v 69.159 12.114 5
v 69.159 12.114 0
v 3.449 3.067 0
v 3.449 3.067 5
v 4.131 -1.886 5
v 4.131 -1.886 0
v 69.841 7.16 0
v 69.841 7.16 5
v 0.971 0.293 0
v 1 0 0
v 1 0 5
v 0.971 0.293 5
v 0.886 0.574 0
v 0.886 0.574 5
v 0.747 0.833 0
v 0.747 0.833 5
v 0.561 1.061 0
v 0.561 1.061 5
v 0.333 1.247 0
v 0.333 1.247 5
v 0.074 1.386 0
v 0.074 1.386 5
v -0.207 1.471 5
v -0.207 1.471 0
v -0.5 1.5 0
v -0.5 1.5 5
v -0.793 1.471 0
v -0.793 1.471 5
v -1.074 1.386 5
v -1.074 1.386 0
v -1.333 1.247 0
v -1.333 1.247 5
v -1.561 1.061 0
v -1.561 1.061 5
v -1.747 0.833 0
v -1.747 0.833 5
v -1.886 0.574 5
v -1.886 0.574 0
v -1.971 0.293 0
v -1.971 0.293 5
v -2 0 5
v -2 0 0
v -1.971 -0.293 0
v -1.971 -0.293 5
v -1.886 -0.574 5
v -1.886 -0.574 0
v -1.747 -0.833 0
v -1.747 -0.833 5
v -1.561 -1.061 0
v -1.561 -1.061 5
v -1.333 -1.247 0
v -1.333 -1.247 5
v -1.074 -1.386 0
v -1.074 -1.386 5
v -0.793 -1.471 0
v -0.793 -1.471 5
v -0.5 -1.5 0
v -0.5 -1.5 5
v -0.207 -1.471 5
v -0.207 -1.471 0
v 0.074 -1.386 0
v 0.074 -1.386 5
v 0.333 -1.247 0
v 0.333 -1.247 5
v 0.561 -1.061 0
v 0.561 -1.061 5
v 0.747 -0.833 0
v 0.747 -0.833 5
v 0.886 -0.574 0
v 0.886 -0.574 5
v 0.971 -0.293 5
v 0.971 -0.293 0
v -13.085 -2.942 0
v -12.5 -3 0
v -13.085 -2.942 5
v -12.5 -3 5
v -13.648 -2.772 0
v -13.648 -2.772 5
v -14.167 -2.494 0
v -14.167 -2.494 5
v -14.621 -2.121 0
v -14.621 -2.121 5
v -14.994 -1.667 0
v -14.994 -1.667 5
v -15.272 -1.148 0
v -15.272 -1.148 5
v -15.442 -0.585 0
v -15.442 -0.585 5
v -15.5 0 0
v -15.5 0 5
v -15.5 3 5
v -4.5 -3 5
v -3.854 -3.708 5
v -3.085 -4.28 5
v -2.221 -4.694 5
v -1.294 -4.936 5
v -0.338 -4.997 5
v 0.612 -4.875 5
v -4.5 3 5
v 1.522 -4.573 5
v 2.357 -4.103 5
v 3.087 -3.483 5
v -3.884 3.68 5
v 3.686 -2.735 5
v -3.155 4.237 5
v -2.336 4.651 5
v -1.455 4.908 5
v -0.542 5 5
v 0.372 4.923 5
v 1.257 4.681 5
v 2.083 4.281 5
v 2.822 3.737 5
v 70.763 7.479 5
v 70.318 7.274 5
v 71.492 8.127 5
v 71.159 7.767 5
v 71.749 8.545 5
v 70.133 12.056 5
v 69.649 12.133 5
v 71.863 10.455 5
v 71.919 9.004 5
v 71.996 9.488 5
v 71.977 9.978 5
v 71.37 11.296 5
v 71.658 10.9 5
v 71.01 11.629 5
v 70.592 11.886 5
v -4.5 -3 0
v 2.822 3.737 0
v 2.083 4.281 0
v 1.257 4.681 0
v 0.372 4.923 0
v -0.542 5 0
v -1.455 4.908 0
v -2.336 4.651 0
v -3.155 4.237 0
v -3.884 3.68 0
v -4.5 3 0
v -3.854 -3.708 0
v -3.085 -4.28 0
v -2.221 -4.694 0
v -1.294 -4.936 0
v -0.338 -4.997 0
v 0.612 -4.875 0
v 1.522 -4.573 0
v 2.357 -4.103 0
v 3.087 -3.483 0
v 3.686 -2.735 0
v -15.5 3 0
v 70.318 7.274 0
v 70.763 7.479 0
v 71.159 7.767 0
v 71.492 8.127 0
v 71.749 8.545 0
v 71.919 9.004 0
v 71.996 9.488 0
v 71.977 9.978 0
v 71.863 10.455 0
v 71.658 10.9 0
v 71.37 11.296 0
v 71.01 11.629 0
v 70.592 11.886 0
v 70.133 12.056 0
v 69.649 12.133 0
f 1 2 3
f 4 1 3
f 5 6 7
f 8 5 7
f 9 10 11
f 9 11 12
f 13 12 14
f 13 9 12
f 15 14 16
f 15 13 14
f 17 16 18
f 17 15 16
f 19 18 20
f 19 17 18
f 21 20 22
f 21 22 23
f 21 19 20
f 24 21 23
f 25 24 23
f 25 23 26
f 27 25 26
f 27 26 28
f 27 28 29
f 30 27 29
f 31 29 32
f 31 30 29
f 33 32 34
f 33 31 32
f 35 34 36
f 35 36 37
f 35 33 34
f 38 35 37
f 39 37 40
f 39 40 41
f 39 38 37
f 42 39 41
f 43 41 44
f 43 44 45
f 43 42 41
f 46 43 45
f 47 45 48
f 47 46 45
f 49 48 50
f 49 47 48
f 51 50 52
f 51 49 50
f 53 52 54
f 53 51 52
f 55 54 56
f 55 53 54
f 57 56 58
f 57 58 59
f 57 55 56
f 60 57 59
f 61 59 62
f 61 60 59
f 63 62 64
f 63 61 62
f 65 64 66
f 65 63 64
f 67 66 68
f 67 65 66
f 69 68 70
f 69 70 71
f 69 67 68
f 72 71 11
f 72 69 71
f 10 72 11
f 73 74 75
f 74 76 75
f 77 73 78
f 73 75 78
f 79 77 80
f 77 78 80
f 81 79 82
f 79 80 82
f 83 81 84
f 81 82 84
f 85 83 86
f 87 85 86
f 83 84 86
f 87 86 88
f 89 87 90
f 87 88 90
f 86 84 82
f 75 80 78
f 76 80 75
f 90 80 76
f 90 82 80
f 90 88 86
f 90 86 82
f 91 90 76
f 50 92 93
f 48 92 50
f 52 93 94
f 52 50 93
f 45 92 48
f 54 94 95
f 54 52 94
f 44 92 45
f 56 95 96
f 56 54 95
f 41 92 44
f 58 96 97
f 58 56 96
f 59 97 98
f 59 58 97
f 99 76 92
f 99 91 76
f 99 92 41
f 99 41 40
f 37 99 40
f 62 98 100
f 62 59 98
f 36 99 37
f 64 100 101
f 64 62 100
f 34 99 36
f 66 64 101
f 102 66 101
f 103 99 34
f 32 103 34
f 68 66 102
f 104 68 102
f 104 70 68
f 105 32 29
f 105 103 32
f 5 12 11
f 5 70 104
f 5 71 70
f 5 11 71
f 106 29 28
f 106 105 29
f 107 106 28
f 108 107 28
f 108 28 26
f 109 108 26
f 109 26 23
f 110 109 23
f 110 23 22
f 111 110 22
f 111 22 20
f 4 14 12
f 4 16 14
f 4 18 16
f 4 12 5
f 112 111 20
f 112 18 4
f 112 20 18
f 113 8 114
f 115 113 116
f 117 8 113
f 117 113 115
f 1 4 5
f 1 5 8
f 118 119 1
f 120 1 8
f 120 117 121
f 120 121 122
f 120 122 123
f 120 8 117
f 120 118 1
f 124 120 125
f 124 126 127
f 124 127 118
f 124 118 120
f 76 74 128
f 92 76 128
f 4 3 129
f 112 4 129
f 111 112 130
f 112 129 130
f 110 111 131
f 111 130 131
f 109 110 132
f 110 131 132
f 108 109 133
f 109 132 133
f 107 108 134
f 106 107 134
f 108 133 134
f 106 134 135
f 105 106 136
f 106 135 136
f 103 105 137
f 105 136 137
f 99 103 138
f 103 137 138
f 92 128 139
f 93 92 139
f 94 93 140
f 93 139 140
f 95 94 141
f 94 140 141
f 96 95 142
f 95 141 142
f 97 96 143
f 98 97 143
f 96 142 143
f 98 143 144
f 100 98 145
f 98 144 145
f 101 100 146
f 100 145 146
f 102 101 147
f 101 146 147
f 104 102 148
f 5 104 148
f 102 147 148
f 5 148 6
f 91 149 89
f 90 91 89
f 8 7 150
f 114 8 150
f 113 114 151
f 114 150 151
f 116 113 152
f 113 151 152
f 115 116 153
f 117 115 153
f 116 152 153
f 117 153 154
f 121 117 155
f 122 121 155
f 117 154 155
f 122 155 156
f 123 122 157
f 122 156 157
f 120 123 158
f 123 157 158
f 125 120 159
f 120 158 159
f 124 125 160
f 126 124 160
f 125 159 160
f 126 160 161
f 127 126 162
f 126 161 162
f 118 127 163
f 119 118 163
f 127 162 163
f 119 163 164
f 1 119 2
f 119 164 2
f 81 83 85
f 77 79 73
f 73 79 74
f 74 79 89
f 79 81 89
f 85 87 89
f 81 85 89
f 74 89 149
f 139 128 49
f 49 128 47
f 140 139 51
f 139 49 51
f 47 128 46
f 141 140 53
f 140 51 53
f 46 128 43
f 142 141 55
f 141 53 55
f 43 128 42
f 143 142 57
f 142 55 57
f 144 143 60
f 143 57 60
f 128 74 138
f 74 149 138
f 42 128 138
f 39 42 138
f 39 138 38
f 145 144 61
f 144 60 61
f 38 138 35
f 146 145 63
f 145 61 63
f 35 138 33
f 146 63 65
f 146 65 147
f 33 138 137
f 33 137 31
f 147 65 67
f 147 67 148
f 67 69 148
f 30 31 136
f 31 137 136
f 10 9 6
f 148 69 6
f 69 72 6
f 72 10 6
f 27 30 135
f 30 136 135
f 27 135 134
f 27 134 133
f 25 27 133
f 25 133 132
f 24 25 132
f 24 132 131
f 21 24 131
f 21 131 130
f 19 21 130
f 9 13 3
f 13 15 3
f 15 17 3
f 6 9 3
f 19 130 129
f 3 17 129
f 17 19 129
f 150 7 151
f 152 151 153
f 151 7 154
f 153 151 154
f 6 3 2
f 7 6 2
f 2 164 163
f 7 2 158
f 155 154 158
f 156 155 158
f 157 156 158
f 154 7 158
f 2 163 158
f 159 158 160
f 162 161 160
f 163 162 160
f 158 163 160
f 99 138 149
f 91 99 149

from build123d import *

# Parameters (mm, degrees)
SKETCH1_R           = 1.5
BOSS_EXTRUDE1_DEPTH = 5
FILLET1_R           = 3
BOSS_EXTRUDE2_START = -5
BOSS_EXTRUDE2_DEPTH = 5


with BuildPart() as part:
    # Sketch1 → Boss-Extrude1 (new body)
    with BuildSketch(Plane.XY):
        with BuildLine():
            Line((-15.5, -3), (-12.5, -3))
            Line((-12.5, -3), (-4.5, -3))
            ThreePointArc((-4.5, -3), (-0.5, -5), (3.5, -3))
            ThreePointArc((3.5, -3), (4.5, 0), (3.5, 3))
            ThreePointArc((3.5, 3), (-0.5, 5), (-4.5, 3))
            Line((-4.5, 3), (-12.5, 3))
            Line((-12.5, 3), (-15.5, 3))
            Line((-15.5, 3), (-15.5, -3))
        make_face()
        with Locations((-0.5, 0)):
            Circle(SKETCH1_R, mode=Mode.SUBTRACT)
    extrude(amount=BOSS_EXTRUDE1_DEPTH)

    # Fillet1
    fillet1_edges = [part.edges().sort_by_distance(p)[0] for p in [
        (-15.5, -3, 2.5),
    ]]
    fillet(fillet1_edges, radius=FILLET1_R)

    # Sketch2 → Boss-Extrude2 (add)
    with BuildSketch(Plane.XY.offset(5).offset(BOSS_EXTRUDE2_START)):
        with BuildLine():
            Line((4.130629225, -1.886073429), (69.840963555, 7.16038973))
            ThreePointArc((69.840963555, 7.16038973), (71.97663963, 9.977992914), (69.159036445, 12.113668989))
            Line((69.159036445, 12.113668989), (3.448702116, 3.06720583))
            ThreePointArc((3.448702116, 3.06720583), (4.453279259, 0.681927109), (4.130629225, -1.886073429))
        make_face()
    extrude(amount=BOSS_EXTRUDE2_DEPTH)


solid = part.part
